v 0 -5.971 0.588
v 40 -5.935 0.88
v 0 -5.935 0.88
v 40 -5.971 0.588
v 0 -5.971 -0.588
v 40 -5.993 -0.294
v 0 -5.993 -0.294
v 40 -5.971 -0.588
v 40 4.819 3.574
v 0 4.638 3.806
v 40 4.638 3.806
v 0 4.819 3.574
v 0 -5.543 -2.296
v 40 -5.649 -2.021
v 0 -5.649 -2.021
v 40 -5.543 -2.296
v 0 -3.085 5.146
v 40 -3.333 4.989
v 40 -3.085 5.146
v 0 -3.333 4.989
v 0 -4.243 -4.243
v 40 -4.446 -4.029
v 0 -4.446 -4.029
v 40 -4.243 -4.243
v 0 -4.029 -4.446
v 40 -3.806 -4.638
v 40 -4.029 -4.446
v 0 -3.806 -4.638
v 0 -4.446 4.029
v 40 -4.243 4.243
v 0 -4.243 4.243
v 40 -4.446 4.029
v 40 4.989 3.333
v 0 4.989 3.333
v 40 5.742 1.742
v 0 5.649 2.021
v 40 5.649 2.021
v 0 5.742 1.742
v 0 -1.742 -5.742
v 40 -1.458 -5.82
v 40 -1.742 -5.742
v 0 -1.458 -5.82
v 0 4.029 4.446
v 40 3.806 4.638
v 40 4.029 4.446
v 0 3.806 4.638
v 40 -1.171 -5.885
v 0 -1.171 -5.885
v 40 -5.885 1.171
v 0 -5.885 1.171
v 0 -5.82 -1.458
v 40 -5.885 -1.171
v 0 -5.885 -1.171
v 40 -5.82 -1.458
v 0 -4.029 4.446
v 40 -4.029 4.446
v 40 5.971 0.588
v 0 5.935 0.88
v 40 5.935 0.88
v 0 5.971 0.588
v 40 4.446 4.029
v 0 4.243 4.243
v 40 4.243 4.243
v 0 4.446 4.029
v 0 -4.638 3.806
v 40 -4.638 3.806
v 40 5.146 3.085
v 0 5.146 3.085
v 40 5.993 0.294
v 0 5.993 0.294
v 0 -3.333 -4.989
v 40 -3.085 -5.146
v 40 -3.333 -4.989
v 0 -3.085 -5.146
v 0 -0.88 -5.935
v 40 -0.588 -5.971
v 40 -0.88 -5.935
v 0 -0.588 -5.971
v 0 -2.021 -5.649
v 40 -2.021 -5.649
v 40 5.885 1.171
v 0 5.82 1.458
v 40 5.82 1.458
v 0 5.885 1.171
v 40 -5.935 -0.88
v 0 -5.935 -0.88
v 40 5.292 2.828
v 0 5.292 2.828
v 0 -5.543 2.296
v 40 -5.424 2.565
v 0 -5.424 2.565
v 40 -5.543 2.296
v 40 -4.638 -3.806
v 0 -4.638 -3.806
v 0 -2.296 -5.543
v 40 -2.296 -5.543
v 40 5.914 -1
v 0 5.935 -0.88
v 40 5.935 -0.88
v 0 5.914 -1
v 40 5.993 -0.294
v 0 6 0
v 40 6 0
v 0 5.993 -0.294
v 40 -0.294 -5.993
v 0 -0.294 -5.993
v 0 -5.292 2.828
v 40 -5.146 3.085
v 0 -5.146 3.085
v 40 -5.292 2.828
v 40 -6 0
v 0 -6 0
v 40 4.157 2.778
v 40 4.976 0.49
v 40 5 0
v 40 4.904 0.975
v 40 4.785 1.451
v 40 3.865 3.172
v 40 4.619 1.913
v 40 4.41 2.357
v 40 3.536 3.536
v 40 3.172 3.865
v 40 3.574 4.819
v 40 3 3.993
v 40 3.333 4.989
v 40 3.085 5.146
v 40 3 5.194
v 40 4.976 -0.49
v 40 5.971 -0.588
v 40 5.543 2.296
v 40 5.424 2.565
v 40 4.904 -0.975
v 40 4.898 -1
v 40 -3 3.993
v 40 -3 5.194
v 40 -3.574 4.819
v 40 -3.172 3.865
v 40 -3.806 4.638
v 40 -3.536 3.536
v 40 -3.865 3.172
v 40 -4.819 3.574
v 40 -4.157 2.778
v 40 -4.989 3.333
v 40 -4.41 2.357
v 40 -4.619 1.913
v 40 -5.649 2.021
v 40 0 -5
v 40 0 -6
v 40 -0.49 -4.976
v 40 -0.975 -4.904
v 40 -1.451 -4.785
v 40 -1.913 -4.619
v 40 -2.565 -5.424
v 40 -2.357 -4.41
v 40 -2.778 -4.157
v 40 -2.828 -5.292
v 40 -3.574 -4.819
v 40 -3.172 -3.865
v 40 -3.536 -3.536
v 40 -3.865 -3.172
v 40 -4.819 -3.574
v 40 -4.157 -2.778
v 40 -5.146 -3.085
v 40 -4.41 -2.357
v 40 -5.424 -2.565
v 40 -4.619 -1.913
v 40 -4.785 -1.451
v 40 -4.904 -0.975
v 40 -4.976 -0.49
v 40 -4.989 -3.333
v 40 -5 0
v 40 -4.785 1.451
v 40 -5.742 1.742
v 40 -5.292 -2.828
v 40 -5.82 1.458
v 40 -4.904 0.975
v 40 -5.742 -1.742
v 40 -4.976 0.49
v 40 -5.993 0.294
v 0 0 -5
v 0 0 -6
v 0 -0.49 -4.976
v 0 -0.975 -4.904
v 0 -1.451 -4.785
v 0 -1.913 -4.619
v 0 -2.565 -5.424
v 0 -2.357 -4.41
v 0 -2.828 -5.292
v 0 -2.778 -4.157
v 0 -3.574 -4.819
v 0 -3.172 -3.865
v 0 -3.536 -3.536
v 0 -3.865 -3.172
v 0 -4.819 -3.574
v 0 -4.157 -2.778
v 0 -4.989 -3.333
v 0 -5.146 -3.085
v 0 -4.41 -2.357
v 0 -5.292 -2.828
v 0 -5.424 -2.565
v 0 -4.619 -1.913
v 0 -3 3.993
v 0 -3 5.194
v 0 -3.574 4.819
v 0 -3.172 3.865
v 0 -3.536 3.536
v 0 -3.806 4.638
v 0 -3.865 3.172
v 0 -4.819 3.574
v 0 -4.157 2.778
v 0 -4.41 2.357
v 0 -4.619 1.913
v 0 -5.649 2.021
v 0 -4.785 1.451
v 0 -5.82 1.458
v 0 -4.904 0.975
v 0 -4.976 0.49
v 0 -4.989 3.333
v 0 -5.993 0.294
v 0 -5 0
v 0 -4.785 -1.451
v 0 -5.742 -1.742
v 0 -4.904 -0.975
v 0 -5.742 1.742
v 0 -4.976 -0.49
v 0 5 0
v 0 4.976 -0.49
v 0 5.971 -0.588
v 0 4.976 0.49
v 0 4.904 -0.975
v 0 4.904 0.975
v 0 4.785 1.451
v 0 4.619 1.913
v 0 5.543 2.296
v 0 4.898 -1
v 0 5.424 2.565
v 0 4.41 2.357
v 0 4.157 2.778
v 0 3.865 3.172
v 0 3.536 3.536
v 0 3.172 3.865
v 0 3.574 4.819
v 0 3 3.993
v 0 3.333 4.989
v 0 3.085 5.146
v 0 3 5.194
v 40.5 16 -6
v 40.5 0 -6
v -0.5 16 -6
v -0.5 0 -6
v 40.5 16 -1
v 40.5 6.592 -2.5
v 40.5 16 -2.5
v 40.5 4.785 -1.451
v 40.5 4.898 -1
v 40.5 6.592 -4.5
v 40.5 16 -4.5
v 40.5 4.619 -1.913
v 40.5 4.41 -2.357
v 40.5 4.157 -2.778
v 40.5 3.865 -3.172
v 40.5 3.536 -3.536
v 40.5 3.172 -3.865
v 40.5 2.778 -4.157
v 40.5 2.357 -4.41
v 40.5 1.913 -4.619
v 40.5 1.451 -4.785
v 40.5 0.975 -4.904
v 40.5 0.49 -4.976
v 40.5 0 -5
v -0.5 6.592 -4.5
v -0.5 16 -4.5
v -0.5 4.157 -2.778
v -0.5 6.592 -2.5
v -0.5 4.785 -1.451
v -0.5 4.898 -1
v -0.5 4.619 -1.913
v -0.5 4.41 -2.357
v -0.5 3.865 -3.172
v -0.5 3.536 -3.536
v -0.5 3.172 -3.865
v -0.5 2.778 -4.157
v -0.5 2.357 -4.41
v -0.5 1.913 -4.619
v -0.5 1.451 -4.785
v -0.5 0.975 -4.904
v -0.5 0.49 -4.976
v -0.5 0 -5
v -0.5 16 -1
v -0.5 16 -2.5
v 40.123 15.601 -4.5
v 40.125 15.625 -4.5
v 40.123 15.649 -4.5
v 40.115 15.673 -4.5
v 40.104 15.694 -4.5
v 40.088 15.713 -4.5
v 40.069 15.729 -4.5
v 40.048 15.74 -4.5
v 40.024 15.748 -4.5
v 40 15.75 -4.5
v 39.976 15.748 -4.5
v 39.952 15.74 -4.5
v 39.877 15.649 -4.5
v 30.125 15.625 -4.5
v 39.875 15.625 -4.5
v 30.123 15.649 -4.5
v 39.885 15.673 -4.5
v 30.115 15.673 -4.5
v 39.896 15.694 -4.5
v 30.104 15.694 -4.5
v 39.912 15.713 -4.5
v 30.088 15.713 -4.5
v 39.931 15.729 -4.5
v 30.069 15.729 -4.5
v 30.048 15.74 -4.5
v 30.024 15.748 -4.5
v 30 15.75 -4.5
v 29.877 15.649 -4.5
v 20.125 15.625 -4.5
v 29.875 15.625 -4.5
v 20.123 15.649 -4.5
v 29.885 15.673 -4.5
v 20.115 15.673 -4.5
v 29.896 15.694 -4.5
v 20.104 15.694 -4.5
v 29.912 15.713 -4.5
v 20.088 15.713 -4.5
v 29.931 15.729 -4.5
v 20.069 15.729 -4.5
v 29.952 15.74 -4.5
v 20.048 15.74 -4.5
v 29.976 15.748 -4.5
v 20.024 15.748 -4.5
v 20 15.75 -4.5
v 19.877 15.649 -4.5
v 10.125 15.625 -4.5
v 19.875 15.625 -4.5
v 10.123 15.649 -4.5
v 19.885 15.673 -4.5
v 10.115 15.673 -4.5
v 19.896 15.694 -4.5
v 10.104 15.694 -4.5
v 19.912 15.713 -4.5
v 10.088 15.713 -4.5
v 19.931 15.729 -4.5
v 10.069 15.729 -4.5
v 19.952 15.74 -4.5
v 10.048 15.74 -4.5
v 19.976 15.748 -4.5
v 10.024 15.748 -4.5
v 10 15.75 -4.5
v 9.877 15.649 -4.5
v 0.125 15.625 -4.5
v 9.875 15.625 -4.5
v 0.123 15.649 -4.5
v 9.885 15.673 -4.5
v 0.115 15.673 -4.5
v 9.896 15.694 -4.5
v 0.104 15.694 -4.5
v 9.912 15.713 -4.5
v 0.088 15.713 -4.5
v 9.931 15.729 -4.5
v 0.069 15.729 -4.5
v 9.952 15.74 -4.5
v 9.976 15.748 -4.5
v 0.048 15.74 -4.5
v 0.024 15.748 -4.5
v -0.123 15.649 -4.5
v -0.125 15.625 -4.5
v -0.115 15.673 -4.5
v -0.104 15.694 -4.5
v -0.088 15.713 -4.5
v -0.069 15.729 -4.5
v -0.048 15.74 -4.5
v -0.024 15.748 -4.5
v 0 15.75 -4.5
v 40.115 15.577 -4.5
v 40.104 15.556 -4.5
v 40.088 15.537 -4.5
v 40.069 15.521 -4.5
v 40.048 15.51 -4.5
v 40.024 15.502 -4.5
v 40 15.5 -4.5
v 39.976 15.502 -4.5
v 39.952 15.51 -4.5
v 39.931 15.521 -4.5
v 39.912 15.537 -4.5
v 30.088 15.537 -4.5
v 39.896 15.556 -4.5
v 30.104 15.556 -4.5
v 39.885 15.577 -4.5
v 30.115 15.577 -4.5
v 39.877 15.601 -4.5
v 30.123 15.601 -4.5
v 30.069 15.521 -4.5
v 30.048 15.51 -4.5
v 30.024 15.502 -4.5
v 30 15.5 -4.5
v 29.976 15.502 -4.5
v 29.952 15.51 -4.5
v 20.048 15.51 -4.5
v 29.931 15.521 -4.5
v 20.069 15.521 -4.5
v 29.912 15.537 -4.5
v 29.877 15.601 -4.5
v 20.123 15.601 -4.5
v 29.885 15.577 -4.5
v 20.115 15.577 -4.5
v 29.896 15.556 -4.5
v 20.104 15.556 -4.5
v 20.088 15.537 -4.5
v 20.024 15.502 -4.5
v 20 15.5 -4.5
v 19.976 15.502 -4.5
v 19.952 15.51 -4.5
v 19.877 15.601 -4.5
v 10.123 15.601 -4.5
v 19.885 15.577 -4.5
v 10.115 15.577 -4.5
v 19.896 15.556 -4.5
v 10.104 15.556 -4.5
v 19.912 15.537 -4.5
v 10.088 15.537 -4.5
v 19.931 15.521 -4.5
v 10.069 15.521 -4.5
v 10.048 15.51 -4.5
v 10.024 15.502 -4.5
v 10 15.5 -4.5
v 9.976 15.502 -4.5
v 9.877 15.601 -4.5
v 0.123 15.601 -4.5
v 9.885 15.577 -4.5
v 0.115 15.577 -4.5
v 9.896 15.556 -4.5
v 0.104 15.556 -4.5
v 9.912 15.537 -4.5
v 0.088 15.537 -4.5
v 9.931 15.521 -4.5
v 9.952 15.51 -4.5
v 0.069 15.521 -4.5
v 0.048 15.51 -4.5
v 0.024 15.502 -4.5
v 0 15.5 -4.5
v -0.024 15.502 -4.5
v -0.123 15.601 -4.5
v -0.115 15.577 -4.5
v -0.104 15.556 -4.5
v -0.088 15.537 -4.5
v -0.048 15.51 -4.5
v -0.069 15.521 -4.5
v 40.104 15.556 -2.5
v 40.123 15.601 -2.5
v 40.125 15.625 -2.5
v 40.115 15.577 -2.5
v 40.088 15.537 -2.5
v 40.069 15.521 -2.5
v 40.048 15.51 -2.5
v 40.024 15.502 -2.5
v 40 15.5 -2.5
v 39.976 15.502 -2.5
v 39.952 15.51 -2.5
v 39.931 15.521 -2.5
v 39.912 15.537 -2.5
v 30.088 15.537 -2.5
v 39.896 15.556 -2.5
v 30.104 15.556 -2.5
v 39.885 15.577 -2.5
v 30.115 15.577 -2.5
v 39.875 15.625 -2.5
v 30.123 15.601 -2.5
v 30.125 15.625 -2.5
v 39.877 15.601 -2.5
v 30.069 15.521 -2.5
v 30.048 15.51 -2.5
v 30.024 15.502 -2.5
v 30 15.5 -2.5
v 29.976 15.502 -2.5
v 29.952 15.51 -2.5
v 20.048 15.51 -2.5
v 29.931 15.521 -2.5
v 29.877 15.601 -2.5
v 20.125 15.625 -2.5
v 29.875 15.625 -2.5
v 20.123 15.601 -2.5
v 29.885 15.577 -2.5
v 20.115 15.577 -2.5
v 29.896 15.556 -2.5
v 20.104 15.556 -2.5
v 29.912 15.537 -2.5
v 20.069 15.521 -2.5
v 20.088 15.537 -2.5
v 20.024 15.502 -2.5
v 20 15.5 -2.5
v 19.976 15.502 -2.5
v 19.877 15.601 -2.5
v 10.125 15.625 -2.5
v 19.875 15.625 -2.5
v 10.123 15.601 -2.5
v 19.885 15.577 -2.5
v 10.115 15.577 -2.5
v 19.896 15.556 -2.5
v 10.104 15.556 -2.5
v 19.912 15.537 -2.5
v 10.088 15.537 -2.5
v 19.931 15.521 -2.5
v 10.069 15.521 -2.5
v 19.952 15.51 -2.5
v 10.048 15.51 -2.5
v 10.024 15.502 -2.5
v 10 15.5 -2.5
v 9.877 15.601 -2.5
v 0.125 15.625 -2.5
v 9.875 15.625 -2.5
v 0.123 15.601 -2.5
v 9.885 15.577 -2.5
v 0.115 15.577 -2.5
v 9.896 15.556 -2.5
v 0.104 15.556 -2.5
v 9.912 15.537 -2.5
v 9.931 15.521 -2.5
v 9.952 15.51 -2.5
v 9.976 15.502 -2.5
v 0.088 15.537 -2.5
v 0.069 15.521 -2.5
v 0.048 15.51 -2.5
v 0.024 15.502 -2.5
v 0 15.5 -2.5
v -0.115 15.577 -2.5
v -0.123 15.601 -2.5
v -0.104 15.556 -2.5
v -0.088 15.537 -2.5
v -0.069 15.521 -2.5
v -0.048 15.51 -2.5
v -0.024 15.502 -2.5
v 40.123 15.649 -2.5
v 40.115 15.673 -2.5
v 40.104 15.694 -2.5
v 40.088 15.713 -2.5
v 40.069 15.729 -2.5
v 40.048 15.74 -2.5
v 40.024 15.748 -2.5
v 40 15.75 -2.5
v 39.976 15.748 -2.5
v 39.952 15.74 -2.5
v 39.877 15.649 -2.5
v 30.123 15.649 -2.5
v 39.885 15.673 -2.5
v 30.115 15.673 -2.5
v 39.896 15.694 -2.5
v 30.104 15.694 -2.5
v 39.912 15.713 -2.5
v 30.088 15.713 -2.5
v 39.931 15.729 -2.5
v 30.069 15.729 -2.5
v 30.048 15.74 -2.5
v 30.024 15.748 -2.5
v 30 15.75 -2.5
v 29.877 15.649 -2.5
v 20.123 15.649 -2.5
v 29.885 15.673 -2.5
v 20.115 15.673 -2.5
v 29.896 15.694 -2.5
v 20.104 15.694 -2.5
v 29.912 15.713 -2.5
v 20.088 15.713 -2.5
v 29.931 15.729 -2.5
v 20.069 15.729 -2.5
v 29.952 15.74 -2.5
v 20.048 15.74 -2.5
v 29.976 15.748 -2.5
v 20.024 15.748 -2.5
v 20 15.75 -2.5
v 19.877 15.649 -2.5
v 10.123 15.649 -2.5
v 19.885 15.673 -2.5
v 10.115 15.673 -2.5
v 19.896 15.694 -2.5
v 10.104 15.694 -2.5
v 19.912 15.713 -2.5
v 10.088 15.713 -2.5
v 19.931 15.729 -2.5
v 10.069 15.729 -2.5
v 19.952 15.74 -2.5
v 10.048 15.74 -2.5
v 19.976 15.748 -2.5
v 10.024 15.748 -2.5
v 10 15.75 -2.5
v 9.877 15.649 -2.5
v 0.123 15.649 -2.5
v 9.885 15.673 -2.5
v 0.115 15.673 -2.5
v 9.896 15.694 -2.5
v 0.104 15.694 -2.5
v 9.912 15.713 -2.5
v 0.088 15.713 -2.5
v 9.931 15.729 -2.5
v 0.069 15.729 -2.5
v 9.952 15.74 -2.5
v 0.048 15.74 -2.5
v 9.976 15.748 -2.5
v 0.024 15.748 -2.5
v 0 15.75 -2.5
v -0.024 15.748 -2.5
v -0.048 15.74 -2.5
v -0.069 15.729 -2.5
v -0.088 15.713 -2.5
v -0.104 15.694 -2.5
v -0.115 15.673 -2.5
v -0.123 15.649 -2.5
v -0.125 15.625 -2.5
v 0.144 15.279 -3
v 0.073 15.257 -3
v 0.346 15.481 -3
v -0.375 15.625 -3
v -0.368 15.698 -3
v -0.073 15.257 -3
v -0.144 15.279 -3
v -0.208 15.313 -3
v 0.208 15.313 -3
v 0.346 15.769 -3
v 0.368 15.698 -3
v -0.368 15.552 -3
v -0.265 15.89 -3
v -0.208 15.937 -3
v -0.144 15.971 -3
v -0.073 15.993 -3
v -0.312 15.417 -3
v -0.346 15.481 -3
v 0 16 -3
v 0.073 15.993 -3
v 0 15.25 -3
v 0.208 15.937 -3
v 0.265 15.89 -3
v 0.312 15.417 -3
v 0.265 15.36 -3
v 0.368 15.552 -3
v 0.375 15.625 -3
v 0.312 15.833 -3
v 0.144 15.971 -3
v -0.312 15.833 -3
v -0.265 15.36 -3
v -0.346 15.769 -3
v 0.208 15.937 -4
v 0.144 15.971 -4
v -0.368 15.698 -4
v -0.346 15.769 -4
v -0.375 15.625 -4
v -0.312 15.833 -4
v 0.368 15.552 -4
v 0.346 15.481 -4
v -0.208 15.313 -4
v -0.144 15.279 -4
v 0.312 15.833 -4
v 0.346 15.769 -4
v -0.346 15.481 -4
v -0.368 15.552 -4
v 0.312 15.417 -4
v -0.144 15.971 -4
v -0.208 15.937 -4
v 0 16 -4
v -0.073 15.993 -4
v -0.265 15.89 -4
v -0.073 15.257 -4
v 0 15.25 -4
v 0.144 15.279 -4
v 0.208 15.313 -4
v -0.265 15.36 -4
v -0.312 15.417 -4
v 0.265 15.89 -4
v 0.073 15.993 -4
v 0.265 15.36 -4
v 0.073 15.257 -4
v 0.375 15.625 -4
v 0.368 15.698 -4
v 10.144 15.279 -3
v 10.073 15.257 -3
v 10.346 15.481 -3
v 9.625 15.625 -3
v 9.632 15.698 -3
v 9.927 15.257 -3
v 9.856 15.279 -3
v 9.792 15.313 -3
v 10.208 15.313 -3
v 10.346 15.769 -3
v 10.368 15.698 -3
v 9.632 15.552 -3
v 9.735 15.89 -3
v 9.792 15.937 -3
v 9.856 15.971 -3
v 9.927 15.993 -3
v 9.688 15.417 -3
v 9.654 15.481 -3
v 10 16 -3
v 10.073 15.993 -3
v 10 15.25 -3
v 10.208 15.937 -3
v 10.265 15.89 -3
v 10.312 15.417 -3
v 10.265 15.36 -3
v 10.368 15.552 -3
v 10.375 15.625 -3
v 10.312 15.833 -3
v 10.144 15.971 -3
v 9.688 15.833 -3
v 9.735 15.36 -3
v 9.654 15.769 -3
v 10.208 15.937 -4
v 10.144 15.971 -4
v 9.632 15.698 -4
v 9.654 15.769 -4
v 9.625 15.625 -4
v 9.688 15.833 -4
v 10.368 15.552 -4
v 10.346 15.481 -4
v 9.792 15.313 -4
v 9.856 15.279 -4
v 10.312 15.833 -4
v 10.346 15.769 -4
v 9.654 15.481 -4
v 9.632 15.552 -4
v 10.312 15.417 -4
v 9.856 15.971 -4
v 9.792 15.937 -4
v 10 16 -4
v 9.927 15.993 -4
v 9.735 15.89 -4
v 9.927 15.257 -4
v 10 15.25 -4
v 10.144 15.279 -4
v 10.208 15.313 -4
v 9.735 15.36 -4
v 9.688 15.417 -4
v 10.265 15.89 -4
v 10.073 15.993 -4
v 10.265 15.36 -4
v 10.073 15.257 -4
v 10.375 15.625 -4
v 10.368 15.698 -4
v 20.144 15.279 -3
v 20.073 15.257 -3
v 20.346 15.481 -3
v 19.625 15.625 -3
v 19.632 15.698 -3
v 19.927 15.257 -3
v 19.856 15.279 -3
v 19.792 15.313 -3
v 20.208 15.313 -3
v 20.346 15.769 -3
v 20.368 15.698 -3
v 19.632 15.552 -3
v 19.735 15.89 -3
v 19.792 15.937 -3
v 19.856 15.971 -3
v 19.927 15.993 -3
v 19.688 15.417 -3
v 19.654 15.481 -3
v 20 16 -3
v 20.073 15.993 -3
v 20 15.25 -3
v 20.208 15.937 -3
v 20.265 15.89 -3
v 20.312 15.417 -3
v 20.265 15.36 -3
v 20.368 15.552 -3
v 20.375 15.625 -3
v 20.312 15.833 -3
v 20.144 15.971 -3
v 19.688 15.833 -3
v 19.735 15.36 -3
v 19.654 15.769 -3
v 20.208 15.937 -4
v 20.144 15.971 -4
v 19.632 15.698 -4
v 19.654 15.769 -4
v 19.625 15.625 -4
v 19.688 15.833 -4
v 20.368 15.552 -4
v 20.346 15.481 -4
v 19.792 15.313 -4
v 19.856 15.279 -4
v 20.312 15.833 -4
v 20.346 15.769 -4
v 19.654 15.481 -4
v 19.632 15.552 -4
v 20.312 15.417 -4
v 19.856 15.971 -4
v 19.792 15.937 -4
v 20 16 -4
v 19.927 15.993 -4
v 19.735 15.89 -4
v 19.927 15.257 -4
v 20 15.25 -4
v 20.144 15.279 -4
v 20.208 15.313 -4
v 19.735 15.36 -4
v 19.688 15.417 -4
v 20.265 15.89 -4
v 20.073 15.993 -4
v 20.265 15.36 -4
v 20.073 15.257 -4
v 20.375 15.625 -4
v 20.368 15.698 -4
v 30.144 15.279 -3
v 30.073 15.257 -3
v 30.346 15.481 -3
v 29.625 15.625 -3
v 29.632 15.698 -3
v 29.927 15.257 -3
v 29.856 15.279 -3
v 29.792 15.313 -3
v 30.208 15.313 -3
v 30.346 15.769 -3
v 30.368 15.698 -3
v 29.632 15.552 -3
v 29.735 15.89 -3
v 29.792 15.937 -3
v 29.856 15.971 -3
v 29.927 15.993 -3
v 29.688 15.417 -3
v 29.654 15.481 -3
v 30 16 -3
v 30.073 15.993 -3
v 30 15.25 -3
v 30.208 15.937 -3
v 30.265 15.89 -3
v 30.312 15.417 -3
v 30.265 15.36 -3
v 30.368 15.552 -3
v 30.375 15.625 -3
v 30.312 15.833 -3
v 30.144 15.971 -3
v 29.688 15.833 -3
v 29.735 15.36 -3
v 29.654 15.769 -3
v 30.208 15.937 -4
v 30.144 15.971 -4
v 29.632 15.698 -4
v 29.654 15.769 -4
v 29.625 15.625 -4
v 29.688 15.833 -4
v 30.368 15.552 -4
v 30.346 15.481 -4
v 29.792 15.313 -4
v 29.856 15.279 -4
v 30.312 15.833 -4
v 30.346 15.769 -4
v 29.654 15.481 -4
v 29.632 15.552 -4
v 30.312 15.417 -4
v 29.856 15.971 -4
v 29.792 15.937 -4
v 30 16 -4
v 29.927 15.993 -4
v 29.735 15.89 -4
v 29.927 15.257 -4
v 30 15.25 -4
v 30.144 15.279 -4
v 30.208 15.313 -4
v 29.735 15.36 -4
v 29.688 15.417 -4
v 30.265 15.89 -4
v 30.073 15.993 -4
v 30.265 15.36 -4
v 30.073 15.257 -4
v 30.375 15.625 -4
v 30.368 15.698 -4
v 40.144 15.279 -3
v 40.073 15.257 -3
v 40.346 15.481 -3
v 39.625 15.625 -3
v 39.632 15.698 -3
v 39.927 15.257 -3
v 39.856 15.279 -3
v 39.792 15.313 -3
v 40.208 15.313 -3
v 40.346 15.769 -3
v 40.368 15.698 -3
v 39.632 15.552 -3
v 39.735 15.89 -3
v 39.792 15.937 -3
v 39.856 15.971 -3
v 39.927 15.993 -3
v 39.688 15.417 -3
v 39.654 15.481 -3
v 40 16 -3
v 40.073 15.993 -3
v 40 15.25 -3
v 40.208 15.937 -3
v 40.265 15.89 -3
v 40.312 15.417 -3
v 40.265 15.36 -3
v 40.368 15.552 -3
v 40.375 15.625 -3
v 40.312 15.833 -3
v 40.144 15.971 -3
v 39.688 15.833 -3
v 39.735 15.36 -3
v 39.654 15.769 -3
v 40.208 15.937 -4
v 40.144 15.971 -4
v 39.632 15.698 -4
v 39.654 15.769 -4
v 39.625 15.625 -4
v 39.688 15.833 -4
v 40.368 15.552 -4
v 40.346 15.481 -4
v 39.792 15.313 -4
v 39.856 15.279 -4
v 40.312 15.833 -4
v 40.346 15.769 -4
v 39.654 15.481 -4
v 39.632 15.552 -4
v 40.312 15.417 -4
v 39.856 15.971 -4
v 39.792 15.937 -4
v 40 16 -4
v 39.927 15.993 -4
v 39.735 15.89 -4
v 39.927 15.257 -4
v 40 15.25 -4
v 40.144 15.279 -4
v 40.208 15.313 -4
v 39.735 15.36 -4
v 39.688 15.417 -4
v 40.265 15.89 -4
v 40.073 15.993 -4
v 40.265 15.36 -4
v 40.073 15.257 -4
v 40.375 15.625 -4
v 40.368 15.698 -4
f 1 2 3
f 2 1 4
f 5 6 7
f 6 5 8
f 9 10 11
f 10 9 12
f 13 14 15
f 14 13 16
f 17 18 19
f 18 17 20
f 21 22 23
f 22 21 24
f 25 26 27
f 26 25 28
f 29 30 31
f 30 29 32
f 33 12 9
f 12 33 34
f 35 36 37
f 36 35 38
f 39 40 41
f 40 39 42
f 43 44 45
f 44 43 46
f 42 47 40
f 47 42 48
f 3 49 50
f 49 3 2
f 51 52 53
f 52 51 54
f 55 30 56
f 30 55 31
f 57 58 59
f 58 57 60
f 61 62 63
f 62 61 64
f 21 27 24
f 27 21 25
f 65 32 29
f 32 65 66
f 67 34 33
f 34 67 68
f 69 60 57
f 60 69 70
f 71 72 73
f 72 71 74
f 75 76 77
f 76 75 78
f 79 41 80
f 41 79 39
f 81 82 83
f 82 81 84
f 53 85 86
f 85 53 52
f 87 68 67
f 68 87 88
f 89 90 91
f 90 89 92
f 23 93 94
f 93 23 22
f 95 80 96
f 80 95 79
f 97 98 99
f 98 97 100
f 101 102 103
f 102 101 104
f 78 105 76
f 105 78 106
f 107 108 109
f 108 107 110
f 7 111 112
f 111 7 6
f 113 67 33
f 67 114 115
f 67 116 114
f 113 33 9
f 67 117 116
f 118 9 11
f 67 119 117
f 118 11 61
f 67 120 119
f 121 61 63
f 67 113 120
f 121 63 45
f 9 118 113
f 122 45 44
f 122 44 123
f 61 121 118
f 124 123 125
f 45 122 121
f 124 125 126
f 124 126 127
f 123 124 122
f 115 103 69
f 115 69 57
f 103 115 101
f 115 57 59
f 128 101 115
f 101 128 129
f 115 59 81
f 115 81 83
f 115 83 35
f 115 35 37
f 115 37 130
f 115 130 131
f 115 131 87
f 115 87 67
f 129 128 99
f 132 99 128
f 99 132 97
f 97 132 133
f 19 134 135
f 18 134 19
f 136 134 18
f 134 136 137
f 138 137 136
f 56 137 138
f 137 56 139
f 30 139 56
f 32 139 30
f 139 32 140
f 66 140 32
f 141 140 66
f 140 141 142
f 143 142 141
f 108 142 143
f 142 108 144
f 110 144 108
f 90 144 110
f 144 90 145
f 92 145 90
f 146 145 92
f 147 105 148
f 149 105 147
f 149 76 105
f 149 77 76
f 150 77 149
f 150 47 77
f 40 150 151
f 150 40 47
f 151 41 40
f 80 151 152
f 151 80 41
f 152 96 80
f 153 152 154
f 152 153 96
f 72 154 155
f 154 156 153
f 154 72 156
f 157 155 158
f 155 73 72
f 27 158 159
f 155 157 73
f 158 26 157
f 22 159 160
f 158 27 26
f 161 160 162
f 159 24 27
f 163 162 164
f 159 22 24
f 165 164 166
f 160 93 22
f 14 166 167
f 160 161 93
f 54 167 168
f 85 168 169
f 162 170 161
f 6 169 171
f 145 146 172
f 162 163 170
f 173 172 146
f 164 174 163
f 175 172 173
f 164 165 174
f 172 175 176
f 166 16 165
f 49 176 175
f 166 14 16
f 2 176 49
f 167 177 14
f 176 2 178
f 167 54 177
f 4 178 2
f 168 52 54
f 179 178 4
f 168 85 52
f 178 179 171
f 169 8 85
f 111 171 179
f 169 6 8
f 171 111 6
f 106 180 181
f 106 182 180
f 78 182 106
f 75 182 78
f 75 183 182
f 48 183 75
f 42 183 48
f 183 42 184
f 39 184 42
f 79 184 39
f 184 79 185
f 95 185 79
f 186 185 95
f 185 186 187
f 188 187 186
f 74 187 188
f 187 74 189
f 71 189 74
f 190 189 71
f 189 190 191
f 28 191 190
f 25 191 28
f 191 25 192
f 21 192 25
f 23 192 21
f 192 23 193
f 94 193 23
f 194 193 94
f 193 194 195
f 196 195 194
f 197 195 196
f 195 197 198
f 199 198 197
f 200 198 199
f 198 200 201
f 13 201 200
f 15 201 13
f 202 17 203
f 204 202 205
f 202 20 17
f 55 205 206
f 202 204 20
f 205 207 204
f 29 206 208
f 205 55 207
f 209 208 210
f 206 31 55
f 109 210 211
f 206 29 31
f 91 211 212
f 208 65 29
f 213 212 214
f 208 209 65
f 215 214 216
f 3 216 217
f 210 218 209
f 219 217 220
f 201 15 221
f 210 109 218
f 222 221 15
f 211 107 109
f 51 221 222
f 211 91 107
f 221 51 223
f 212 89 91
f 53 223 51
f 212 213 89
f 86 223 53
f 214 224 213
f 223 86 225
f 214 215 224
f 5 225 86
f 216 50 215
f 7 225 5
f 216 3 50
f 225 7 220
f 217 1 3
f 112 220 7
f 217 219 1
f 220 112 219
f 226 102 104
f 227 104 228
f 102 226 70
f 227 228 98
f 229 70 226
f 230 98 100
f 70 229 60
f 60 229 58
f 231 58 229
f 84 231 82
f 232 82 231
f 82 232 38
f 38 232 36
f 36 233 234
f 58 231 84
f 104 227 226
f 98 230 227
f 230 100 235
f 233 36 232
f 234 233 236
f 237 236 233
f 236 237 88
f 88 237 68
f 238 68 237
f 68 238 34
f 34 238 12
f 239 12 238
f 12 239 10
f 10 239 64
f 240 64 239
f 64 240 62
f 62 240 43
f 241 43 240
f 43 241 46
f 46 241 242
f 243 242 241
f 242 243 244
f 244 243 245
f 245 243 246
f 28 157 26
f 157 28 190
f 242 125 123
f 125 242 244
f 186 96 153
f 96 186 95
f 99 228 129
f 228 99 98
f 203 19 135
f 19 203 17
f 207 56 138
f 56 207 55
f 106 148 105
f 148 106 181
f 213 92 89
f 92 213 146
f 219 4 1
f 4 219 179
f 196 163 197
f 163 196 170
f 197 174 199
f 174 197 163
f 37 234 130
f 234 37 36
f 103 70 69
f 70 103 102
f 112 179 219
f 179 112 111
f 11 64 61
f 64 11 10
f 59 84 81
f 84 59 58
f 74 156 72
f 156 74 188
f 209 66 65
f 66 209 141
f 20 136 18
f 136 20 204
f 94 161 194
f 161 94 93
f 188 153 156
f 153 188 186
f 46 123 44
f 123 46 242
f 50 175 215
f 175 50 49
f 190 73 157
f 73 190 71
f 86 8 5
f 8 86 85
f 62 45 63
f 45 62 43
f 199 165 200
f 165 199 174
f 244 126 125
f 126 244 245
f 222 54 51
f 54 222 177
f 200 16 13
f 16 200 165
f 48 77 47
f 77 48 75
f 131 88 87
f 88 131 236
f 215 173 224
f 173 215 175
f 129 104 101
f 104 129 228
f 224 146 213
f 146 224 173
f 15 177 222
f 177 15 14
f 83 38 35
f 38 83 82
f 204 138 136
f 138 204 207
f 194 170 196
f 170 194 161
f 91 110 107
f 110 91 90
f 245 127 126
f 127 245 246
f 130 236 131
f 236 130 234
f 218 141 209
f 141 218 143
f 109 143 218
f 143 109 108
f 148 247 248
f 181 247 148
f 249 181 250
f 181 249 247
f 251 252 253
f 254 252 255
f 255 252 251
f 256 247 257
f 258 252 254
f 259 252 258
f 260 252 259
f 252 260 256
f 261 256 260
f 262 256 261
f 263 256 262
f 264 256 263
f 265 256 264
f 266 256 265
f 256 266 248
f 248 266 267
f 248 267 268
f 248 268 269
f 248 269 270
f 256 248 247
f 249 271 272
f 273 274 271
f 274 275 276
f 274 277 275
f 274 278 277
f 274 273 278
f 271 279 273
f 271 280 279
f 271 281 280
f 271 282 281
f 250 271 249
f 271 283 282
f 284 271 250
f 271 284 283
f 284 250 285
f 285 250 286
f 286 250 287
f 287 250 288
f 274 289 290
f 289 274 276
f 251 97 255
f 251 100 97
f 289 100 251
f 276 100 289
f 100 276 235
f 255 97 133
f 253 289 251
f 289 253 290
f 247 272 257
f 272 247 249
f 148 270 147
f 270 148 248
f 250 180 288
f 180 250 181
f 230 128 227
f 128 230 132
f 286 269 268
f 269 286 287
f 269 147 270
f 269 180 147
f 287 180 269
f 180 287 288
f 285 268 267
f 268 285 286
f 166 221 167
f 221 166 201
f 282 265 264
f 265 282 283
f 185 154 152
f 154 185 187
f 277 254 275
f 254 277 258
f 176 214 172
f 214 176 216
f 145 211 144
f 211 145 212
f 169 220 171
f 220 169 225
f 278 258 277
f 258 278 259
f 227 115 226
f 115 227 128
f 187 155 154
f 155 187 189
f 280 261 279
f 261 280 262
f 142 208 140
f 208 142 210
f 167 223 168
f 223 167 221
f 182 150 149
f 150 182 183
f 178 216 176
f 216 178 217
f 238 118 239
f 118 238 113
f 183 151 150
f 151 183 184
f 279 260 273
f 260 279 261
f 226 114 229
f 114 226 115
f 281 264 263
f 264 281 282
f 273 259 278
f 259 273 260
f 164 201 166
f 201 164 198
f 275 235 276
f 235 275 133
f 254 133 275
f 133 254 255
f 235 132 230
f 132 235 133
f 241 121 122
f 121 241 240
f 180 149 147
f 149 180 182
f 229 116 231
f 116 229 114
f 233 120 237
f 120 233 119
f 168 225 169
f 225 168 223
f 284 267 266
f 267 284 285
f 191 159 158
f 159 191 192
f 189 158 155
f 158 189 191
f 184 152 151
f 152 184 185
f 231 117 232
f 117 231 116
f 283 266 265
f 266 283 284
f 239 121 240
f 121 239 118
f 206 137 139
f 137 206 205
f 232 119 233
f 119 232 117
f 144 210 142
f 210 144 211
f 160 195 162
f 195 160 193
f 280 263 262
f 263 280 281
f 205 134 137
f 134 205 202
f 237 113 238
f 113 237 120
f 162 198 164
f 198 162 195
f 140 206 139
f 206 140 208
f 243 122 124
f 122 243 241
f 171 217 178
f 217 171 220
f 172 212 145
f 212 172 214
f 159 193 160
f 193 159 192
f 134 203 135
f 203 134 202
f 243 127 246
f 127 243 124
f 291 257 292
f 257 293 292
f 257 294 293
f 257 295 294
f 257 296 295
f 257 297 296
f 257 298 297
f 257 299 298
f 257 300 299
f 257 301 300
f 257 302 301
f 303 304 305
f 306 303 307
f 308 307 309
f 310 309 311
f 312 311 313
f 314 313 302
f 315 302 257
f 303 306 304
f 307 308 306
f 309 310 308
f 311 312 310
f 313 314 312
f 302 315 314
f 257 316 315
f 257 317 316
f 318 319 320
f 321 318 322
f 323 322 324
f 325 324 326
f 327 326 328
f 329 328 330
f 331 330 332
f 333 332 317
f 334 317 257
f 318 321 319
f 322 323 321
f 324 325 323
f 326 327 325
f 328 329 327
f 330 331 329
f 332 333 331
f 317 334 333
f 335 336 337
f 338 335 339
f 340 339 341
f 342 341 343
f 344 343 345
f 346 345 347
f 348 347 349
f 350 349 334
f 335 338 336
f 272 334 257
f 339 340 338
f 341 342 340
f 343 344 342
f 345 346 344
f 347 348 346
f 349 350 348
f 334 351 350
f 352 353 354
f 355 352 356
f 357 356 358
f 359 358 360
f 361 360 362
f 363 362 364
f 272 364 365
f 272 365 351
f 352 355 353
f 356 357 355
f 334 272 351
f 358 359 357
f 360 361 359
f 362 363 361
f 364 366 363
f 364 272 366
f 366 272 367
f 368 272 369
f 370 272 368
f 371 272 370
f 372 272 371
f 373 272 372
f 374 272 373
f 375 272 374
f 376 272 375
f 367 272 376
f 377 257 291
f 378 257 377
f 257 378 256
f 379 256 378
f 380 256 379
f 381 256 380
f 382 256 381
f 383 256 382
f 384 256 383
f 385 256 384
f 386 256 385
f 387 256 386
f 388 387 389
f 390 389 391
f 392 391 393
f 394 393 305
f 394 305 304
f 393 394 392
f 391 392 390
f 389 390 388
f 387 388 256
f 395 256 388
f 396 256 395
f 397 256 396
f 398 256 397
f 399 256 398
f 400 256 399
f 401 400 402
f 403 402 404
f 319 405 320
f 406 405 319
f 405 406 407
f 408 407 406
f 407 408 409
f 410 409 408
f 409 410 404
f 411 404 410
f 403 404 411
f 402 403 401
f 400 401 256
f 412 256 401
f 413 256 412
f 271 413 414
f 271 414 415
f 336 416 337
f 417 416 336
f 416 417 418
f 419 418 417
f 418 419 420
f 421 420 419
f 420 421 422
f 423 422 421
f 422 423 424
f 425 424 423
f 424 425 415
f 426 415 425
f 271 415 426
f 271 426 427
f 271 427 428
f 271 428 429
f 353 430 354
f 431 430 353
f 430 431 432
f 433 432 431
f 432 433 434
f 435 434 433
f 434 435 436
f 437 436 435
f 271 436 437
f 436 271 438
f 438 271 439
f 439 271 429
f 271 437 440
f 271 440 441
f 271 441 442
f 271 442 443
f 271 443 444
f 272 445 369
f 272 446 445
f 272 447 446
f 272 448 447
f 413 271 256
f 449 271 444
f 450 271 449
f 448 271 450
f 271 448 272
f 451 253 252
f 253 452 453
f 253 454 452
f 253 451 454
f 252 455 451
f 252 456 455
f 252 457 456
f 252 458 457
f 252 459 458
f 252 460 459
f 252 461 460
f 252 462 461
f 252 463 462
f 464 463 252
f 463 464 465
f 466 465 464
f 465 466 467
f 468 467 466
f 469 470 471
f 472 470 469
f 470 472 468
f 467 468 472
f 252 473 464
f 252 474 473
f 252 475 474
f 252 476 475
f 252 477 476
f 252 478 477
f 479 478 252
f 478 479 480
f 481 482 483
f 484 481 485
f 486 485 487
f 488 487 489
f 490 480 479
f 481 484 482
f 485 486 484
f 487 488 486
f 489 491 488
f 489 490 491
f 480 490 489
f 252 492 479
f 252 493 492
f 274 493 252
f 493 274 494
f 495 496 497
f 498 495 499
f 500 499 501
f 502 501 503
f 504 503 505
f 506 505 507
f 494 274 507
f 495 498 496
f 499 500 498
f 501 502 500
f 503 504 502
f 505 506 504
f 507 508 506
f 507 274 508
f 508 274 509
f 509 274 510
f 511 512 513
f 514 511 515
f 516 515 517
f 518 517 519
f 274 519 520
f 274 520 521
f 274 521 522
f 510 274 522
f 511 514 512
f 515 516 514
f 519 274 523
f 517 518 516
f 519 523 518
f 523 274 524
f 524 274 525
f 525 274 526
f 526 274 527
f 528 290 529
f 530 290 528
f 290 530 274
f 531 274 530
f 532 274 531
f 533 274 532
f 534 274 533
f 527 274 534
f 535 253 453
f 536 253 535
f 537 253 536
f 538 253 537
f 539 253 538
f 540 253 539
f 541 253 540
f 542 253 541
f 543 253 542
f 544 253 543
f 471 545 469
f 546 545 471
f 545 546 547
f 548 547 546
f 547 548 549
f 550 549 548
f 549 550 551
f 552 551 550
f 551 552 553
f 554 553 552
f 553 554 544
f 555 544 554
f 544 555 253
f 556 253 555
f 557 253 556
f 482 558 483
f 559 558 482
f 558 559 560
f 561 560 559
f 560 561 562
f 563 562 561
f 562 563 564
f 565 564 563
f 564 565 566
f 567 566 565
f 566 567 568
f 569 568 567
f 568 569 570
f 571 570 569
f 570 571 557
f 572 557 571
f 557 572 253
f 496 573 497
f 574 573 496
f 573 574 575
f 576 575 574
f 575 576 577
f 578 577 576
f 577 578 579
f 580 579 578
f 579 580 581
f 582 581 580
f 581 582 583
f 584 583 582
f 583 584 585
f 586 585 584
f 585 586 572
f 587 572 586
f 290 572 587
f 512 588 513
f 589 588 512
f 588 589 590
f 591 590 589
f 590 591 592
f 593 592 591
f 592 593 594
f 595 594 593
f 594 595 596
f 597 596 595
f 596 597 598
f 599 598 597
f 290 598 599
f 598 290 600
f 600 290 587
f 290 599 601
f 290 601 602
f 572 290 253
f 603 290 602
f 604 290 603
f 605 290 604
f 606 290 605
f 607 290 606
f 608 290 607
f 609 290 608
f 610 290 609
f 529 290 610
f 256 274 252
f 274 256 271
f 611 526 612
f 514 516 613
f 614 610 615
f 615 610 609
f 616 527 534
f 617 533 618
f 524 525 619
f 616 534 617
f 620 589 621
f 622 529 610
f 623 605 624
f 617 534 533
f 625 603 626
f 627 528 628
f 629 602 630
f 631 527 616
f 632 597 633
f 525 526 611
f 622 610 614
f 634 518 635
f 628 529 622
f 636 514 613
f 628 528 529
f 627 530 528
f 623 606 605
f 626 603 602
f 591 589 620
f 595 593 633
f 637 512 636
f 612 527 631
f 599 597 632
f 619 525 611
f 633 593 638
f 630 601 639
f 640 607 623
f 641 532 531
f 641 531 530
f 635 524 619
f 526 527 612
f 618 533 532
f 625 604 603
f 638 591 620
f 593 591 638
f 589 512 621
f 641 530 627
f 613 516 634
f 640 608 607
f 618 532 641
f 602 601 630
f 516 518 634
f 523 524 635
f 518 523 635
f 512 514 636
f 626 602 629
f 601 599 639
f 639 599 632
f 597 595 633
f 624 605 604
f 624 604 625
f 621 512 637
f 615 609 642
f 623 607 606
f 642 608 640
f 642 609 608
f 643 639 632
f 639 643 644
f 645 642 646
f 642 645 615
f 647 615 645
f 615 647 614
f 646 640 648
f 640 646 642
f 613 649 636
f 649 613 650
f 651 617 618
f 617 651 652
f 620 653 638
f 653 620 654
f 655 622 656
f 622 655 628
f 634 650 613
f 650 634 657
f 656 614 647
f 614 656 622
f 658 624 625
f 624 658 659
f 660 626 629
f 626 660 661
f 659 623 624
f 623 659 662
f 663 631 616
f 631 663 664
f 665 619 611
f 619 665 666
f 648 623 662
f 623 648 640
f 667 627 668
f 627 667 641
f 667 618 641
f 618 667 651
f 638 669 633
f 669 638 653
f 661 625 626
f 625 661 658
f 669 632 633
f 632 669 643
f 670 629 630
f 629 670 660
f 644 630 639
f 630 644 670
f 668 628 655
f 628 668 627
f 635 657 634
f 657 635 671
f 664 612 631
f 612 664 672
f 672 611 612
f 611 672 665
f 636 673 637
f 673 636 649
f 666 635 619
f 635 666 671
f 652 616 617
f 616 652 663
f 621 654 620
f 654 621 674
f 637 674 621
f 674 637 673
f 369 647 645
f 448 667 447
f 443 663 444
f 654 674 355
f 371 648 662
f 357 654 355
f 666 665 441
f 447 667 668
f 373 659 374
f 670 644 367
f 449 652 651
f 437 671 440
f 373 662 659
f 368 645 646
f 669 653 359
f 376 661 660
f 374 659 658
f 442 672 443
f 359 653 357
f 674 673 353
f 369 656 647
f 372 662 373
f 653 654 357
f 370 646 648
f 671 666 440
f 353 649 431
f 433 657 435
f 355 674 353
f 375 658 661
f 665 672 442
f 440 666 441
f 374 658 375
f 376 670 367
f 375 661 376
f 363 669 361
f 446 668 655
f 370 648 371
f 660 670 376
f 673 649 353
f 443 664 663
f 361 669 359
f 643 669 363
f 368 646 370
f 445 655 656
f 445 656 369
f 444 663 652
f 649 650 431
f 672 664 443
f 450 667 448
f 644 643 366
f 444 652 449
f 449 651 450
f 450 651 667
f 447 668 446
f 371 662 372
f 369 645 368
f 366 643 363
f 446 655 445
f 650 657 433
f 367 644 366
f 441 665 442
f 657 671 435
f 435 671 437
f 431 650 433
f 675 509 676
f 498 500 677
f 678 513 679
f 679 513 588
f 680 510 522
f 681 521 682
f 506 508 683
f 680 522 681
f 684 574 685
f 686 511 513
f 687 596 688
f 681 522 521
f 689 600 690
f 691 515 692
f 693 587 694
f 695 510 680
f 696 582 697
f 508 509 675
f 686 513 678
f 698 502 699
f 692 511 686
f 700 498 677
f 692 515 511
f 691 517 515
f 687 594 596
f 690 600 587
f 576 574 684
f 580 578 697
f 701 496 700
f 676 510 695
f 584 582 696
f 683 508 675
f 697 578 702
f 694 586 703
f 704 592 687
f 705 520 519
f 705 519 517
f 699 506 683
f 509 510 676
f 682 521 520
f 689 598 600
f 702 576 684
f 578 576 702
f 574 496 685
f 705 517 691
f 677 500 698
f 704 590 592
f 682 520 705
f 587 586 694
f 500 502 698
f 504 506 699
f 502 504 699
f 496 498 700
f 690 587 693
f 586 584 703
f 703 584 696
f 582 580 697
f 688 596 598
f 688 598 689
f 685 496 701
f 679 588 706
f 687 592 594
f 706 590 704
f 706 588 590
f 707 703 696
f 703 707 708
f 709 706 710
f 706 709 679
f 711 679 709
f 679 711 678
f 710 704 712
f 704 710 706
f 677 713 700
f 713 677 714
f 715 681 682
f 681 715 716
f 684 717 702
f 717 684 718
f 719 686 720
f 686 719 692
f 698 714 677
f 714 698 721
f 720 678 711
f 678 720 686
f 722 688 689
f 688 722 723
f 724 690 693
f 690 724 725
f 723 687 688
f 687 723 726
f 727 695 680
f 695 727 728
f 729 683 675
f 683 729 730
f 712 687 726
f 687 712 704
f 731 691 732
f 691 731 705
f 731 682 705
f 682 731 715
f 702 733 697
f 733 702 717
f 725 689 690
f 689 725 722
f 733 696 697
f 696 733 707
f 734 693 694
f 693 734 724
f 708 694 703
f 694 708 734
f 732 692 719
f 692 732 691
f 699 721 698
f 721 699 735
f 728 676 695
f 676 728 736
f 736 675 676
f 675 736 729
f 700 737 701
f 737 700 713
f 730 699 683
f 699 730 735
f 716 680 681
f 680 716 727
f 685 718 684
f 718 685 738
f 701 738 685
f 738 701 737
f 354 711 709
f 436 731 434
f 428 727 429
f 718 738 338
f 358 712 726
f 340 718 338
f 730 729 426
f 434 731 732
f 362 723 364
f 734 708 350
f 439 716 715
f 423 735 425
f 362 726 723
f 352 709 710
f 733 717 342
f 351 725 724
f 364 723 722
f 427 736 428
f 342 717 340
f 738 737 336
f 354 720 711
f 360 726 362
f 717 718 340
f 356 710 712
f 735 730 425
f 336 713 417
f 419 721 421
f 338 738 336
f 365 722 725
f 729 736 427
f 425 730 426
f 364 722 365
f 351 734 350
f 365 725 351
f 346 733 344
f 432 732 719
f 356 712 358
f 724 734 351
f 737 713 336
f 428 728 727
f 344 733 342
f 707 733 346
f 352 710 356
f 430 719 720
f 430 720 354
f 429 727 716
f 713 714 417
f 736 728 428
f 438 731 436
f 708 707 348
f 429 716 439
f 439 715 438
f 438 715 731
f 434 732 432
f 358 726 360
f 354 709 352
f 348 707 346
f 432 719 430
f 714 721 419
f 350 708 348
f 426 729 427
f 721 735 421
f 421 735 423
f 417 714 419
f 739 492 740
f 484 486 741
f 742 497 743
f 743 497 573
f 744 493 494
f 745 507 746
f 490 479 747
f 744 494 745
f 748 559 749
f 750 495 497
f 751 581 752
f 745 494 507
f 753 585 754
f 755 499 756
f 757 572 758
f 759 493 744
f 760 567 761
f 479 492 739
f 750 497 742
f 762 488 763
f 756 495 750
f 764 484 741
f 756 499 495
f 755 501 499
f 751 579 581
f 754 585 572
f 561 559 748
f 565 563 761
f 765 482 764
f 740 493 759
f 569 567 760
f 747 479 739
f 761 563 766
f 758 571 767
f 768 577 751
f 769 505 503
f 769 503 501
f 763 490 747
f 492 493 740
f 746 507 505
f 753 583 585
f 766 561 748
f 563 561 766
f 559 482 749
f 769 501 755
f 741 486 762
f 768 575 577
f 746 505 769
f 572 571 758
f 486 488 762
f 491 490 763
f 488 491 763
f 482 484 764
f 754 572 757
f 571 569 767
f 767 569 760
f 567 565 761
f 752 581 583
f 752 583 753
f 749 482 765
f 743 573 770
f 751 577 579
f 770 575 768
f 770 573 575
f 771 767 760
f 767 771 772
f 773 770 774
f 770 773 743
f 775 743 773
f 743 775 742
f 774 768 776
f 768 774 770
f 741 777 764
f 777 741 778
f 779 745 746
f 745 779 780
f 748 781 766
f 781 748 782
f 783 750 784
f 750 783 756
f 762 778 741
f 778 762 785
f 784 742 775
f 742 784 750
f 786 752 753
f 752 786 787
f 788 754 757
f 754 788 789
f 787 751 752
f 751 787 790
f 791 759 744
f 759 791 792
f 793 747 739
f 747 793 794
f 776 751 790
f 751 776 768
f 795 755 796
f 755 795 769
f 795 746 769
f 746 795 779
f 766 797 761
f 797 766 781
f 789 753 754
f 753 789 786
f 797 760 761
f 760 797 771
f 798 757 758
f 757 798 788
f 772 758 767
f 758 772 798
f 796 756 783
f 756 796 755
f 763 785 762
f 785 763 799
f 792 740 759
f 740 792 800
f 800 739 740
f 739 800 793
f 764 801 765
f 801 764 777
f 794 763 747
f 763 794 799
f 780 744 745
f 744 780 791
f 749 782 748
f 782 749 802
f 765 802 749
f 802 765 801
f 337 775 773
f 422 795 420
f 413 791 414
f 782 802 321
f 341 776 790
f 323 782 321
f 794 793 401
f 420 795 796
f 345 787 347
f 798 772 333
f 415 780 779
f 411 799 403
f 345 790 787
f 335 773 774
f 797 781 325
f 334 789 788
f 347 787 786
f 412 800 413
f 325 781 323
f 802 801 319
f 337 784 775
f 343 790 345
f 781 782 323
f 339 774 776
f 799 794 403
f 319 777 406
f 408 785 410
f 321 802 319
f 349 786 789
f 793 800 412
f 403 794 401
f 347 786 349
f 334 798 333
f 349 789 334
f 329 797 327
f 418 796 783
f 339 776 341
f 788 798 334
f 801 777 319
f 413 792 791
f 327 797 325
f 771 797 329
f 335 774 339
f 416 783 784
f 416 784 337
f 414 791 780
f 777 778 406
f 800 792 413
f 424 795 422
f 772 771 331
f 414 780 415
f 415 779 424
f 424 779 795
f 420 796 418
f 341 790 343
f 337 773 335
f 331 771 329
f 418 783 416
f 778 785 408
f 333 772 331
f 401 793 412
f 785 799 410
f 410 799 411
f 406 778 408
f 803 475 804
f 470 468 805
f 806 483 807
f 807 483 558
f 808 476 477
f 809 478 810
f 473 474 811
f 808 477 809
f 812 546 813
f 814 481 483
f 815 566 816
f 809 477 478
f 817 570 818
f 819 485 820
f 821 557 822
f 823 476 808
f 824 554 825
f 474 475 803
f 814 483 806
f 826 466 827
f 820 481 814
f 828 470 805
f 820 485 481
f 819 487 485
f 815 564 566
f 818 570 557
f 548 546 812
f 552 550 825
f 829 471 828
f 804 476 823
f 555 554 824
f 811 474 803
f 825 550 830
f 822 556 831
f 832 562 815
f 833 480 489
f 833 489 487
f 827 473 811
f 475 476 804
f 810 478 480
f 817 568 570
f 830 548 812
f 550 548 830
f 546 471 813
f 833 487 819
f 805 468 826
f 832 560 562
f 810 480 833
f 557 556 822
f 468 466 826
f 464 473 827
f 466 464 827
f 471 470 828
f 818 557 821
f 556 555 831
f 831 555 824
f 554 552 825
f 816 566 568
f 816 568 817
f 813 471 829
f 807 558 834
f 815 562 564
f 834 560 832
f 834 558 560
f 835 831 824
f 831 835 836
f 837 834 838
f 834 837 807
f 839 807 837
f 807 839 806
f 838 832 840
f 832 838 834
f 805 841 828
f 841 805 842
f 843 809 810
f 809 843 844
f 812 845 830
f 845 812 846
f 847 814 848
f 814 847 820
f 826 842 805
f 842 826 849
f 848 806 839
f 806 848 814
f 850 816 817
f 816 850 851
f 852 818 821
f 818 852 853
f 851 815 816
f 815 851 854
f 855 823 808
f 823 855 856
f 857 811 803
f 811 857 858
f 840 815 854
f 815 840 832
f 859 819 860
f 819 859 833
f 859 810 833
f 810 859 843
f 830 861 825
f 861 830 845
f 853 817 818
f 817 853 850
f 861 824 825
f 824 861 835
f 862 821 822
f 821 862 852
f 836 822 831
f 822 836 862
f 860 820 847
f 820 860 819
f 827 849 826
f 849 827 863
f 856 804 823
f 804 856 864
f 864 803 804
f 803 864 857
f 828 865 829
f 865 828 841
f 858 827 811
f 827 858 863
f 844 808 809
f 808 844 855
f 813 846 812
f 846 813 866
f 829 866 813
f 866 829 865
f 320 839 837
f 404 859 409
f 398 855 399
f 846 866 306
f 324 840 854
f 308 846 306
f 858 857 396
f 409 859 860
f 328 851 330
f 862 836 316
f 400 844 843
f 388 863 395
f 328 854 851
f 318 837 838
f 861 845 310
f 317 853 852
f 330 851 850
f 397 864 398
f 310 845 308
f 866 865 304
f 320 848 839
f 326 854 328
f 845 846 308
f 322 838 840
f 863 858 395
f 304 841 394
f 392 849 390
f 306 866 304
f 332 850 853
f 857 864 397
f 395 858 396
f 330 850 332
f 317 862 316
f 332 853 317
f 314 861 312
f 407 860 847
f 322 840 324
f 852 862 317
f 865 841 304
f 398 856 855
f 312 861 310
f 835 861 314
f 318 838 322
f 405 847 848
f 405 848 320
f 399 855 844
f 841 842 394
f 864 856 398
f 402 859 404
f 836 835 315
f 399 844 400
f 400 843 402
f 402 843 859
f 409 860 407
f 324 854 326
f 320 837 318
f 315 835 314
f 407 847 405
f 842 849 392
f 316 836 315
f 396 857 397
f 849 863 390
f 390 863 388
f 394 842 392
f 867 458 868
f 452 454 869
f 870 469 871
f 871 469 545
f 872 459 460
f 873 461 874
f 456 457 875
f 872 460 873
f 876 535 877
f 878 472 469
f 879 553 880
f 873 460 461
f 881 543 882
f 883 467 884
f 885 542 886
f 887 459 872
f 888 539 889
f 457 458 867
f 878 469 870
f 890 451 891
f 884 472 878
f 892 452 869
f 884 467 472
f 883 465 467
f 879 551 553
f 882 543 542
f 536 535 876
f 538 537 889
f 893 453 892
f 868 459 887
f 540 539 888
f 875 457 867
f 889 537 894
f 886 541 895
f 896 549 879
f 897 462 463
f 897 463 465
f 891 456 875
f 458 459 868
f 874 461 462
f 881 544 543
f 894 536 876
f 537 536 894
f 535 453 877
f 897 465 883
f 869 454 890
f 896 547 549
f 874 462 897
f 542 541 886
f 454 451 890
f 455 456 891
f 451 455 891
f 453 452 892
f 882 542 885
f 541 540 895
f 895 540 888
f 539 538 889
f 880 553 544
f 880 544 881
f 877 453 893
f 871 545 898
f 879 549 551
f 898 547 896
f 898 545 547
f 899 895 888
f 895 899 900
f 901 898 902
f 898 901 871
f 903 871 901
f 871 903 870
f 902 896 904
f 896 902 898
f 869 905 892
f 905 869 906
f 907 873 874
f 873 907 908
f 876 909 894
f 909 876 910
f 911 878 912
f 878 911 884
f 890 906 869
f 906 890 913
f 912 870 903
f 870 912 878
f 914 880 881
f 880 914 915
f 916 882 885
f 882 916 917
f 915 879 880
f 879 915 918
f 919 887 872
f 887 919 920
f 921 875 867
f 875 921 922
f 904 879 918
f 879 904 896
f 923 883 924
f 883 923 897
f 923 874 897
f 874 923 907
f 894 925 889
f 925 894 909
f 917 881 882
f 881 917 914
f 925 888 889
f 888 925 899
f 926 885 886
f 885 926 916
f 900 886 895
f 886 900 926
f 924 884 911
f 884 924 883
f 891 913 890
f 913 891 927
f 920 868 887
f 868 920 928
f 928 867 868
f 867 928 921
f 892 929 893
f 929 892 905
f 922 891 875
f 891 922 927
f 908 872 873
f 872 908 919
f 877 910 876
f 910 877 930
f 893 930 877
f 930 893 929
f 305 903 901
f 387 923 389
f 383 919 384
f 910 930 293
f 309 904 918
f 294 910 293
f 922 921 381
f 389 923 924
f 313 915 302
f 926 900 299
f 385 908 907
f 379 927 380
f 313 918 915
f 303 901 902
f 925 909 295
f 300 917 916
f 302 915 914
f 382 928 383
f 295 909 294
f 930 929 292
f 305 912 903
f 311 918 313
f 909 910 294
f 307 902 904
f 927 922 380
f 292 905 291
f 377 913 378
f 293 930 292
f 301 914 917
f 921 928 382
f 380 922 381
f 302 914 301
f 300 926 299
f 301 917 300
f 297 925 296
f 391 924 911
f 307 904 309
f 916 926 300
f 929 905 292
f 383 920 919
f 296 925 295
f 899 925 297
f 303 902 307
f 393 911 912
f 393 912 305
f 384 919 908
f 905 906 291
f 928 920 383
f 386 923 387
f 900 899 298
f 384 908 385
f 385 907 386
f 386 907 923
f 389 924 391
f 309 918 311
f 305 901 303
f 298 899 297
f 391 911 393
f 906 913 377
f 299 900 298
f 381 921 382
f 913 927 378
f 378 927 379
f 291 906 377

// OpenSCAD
// Copyright (C) 2016-2017 - Olivier Podevin <hillheaven@free.fr>
//
// Content: A customizable pencil holder for boards.
//
// The script below has the following parameters:
//      - pencil diameter
//      - holder board thickness
//      - scissors upper width
//      - scissors lower width
//      - scissors thickness
//      - magnets diameter
//      - magnets thickness
//
// Advice on parameters' value: while measuring your pencil,
//     provide some space to the pencil to to not been to tight in the holder.
//
// This file is an OpenSCAD script, see <http://www.openscad.org/> for details
//
// This work is licensed under the Creative Commons Attribution 4.0
// International license. To view a copy of this license, visit
// <http://creativecommons.org/licenses/by/4.0/>.

// Parameters in millimeters
pencil_diameter = 10; // Recommended values: {5, 20} 
board_thickness=2;    // Recommended values: {1, 3} 

module flat_holder(diameter, thickness) {
    out_thickness = thickness+3;
    out_diameter = diameter+2;
    offset_saignee=3+diameter/6.28 + thickness;
    length_support=12+thickness*2;
    difference() {
        union() {
            cylinder(d=out_diameter, h=40, $fn=128);
            translate([out_diameter/2-out_thickness,0,-.5])
                cube([out_thickness,length_support,41]);
        }
        translate([0,0,-1])
            cylinder(d=diameter, h=42, $fn=64);
        rotate([0,0,90])
            translate([-3,2,-1])
                cube([6,14,42]);
        translate([1.5+out_diameter/2-out_thickness,offset_saignee,-.75])
            cube([thickness,20,41.5]);
    }
    support_print(diameter, thickness, out_thickness, out_diameter, length_support, 0);
    support_print(diameter, thickness, out_thickness, out_diameter, length_support, 10);
    support_print(diameter, thickness, out_thickness, out_diameter, length_support, 20);
    support_print(diameter, thickness, out_thickness, out_diameter, length_support, 30);
    support_print(diameter, thickness, out_thickness, out_diameter, length_support, 40);
}

module support_print(diameter, thickness, out_thickness, out_diameter, length_support, offset) {
    diam_pointe=0.25;
    diameter_support_print=.75;
    translate([1.5+out_diameter/2-out_thickness,length_support-diameter_support_print/2,offset])
        rotate([0,90,0]) {
            cylinder(d1=diam_pointe, d2=diameter_support_print, h=0.5, $fn=32);
            translate([0,0,0.5])
                cylinder(d=diameter_support_print, h=thickness-1, $fn=32);
            translate([0,0,thickness-.5])
                cylinder(d1=diameter_support_print, d2=diam_pointe, h=0.5, $fn=32);
        }
}

module main() {
    // diameter = {5, 20}
    // thickness = {1,3}
    rotate([0,90,0])
        flat_holder(pencil_diameter, board_thickness);
}

main();
